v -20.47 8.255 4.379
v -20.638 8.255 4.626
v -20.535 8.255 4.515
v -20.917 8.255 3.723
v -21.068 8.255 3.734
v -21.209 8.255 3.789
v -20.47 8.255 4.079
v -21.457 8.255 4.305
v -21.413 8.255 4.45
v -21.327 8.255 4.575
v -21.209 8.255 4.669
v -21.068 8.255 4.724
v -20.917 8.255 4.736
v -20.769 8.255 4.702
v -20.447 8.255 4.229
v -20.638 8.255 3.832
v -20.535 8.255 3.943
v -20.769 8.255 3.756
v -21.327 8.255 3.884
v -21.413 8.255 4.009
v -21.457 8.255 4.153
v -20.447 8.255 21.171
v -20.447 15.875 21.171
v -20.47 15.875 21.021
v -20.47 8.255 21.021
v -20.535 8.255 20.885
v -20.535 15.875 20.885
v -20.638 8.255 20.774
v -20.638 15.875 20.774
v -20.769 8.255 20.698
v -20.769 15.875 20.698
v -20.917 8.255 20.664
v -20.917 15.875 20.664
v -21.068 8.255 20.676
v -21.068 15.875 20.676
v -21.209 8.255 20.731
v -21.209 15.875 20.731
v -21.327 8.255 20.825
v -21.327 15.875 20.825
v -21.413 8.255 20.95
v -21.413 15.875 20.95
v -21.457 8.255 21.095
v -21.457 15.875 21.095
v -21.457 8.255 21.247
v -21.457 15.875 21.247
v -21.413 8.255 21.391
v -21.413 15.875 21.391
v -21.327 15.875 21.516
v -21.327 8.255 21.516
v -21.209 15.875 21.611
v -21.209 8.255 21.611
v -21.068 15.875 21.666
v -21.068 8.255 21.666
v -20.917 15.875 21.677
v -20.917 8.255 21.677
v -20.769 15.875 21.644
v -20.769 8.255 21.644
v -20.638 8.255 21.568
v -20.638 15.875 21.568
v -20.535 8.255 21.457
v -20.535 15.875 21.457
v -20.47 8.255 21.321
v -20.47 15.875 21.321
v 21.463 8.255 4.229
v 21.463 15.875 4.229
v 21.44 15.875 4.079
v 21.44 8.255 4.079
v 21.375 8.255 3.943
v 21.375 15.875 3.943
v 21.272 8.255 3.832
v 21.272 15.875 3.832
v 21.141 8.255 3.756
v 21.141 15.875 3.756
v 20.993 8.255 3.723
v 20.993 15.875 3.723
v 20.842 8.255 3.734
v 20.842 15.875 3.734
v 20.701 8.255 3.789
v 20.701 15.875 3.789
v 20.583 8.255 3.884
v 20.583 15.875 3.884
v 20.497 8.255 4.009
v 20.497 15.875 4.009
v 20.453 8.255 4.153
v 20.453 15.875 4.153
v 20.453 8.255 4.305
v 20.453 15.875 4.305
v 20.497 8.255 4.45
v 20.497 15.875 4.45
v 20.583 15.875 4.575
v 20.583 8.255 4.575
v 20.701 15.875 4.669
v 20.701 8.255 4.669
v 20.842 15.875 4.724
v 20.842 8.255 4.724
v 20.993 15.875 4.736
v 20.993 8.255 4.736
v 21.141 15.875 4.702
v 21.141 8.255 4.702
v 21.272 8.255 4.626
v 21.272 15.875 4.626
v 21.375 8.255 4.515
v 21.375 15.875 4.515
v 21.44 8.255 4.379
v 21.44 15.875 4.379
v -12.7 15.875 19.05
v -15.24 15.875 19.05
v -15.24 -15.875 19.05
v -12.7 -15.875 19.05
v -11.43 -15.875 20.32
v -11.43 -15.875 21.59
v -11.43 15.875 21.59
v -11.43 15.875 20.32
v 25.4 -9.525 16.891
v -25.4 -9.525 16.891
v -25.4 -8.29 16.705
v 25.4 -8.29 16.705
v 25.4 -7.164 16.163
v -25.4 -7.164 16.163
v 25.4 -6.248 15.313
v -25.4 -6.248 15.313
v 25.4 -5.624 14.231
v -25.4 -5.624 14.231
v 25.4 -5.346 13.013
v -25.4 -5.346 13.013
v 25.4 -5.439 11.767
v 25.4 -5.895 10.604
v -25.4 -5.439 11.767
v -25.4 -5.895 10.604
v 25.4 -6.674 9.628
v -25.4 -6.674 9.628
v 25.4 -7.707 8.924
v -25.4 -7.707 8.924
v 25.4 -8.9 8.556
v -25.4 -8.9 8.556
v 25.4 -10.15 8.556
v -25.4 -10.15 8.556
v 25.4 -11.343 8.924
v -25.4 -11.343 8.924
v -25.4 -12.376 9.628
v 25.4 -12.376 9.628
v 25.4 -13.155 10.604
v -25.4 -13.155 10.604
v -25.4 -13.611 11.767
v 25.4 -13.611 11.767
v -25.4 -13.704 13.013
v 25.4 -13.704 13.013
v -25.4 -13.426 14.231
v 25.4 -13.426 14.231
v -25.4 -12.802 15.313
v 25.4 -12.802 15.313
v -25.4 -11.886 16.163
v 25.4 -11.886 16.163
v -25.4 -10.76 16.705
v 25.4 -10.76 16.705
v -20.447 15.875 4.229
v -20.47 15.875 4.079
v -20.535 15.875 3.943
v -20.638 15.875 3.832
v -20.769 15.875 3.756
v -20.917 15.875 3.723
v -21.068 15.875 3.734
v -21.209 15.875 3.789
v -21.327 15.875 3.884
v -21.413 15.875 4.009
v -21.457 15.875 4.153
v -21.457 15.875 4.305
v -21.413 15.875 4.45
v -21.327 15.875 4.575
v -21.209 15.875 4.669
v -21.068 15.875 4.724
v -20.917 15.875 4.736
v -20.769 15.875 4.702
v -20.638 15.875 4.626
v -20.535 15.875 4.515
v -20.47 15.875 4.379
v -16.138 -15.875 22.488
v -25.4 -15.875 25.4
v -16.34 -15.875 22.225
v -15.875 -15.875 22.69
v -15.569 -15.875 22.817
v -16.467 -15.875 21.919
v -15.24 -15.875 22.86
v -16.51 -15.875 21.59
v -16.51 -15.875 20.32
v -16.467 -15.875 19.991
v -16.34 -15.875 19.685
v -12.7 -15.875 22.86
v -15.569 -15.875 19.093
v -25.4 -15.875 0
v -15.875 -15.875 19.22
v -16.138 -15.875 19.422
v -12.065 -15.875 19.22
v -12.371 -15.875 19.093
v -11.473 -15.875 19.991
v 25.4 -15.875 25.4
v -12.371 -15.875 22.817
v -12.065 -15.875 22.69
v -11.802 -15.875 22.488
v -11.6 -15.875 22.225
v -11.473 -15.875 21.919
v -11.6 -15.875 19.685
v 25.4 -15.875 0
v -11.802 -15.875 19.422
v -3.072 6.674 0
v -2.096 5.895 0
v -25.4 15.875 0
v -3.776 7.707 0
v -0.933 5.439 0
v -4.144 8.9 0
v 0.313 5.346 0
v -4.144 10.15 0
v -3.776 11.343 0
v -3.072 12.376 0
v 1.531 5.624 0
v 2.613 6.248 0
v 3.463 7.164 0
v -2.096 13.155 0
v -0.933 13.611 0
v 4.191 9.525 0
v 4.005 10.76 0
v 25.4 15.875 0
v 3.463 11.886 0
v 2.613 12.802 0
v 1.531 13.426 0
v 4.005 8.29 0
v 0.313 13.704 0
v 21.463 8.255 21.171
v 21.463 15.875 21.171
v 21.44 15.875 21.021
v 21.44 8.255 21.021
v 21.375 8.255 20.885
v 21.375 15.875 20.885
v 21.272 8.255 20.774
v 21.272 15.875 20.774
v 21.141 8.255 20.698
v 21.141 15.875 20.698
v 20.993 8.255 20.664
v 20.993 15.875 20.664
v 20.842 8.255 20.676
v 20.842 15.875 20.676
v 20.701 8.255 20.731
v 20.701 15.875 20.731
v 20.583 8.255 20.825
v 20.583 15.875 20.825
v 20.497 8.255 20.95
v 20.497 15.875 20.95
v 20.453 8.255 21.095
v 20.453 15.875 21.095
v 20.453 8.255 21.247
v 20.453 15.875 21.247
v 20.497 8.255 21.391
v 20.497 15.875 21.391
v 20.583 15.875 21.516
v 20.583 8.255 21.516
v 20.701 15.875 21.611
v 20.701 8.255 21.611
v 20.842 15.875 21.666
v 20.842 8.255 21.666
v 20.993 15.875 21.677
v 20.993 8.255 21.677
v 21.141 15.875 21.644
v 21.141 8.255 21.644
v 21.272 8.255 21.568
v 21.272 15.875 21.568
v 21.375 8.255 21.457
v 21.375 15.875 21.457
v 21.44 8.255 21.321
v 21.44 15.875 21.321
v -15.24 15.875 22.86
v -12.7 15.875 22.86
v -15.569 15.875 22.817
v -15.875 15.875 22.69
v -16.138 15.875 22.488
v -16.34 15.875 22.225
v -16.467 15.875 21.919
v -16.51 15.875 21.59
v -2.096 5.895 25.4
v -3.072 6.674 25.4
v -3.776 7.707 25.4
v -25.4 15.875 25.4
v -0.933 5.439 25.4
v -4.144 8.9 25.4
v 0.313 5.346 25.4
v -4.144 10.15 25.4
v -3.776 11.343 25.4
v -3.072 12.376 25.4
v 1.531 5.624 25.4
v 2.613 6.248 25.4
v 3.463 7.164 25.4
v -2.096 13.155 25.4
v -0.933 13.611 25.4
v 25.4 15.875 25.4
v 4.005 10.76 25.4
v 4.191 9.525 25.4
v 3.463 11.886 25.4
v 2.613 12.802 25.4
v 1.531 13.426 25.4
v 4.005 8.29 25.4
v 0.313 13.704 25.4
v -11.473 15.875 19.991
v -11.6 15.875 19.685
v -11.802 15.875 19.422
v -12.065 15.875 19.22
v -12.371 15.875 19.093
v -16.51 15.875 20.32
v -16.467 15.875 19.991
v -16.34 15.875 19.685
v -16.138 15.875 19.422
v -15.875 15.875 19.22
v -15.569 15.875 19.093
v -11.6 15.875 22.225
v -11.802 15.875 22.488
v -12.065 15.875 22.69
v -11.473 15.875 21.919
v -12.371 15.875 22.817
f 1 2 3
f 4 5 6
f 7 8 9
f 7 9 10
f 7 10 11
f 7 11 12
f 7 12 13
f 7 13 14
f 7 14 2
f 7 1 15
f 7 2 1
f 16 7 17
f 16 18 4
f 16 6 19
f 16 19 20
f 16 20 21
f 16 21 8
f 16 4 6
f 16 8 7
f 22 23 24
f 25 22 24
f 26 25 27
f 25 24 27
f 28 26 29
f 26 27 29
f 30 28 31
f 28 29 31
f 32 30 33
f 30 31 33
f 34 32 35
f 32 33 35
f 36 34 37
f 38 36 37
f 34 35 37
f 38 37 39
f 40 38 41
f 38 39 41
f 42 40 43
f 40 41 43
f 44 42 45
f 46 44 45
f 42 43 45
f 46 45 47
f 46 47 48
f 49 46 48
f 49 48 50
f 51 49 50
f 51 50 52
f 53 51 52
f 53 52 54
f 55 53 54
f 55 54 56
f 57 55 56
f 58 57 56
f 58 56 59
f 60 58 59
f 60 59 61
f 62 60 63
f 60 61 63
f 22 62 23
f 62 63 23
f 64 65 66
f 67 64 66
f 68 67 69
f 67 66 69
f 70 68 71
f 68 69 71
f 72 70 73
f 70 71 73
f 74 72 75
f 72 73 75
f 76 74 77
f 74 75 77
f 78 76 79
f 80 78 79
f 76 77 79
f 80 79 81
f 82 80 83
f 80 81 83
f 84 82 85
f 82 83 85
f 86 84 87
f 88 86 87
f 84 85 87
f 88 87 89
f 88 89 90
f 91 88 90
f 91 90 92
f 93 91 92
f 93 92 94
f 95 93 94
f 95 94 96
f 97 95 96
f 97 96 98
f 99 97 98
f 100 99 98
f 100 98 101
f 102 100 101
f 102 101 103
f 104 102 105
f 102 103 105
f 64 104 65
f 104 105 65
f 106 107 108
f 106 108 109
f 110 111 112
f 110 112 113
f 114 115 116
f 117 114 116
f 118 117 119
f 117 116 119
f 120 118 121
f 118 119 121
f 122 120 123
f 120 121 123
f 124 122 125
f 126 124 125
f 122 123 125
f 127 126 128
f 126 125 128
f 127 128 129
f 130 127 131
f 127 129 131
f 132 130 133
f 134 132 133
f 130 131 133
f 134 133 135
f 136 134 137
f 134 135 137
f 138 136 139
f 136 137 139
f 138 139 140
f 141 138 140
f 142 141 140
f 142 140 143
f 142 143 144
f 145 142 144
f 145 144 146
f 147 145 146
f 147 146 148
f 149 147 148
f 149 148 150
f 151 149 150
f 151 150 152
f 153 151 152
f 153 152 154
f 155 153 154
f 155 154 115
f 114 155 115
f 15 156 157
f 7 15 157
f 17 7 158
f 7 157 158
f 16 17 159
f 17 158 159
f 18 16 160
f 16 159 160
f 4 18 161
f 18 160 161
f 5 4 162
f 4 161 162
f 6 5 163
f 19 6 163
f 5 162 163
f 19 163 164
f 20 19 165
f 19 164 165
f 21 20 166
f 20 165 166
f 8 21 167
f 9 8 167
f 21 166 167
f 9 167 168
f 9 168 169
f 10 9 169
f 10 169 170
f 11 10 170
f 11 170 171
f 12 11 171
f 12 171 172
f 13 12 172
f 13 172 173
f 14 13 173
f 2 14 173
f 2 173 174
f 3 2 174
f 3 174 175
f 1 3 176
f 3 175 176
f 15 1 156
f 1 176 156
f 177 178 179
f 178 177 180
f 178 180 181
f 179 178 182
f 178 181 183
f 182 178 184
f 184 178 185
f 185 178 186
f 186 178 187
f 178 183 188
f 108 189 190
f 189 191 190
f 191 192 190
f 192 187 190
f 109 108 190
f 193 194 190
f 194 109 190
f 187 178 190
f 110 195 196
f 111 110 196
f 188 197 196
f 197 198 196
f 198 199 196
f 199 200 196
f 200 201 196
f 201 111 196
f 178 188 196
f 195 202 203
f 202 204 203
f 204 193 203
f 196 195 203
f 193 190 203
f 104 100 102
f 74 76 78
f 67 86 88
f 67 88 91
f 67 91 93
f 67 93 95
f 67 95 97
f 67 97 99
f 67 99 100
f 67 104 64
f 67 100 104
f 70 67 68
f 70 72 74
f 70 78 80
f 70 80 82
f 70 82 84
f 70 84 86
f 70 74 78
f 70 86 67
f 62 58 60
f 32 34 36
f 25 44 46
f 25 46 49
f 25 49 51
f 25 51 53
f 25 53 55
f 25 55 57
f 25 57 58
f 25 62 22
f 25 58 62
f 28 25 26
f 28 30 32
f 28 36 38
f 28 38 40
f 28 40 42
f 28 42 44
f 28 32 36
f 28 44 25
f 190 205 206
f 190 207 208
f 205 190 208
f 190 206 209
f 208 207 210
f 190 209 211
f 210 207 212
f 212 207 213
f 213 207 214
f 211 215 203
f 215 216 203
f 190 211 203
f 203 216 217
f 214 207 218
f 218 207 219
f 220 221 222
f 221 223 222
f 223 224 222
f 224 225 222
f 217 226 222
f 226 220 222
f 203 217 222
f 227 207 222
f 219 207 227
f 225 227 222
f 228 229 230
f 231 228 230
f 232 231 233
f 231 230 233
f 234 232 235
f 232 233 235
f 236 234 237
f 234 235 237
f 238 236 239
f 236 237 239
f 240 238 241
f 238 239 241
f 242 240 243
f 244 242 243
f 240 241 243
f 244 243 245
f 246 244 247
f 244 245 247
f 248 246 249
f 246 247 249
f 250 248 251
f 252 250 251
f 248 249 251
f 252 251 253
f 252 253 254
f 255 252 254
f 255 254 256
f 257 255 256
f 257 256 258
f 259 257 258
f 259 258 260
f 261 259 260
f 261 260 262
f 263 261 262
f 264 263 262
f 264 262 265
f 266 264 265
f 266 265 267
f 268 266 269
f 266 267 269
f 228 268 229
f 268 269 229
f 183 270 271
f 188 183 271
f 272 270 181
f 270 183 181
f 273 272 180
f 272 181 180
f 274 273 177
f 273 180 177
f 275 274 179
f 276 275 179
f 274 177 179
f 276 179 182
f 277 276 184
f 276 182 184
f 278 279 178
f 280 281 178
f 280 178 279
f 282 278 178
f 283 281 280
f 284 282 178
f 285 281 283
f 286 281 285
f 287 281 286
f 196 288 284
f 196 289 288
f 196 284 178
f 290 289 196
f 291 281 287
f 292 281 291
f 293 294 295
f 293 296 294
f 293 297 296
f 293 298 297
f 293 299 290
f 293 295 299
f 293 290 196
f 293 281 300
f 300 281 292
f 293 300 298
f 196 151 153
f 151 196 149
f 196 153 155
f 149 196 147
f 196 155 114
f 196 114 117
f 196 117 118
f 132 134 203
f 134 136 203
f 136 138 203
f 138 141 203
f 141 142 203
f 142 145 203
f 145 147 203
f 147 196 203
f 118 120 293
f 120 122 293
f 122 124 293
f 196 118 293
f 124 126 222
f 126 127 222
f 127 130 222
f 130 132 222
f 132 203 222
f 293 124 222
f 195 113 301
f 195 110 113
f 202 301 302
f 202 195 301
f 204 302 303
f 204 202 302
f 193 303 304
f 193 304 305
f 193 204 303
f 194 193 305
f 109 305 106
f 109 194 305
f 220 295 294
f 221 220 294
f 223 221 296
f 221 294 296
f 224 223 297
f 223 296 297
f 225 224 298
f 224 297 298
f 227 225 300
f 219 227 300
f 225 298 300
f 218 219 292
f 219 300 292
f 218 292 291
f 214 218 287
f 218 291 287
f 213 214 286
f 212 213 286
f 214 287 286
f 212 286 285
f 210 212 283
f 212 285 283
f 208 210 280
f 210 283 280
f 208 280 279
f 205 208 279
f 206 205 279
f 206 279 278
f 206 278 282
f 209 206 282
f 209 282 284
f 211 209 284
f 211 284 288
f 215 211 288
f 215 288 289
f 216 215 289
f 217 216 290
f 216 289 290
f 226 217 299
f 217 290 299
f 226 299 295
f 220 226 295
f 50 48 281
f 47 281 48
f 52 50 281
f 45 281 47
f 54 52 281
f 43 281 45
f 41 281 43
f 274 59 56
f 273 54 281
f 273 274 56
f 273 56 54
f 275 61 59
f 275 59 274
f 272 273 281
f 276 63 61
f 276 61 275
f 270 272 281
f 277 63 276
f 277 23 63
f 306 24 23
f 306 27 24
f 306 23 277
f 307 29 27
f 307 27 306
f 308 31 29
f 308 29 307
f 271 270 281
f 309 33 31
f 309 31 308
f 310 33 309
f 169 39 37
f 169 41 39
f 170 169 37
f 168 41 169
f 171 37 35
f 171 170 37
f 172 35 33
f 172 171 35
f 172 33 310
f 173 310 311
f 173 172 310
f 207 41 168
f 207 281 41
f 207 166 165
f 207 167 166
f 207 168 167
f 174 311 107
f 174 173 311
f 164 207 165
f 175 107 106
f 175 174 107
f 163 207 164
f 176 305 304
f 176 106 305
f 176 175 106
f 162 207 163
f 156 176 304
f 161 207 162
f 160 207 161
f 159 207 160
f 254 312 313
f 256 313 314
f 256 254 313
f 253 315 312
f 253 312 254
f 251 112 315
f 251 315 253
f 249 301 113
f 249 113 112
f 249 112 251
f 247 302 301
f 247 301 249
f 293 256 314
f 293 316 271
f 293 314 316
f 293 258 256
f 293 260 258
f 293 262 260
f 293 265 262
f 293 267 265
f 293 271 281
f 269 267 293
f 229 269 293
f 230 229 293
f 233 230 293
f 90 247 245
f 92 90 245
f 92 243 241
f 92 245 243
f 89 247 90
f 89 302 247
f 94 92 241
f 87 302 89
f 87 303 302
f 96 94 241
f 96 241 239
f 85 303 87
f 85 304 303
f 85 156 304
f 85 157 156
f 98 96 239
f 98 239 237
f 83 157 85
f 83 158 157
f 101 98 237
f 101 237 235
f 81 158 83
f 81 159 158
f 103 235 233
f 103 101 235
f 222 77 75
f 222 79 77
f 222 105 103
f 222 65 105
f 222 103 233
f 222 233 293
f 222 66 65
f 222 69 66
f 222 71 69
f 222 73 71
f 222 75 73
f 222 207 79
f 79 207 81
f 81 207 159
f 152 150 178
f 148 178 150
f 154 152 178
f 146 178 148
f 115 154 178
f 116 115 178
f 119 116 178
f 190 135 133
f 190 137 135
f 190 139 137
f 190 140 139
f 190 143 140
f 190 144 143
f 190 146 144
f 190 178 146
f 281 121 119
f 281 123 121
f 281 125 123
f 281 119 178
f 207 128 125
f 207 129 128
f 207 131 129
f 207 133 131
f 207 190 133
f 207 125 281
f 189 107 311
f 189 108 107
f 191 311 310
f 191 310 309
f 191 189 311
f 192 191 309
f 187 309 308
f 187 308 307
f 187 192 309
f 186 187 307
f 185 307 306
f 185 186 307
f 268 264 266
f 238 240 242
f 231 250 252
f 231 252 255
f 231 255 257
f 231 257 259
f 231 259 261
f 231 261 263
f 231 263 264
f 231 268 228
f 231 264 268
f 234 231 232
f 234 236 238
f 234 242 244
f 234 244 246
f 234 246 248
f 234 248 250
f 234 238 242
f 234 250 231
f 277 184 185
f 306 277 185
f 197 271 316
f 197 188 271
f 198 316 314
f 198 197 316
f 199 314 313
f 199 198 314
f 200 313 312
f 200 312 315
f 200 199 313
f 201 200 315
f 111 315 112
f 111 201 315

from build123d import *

# Parameters (mm, degrees)
SKETCH1_W           = 50.8
SKETCH1_H           = 31.75
BOSS_EXTRUDE1_DEPTH = 25.4
SKETCH4_R           = 4.191
CUT_EXTRUDE1_DEPTH  = 152.4
SKETCH5_R           = 4.191
CUT_EXTRUDE2_DEPTH  = 25.4
SKETCH7_R           = 0.508
CUT_EXTRUDE3_DEPTH  = 7.62
SKETCH9_W           = 5.08
SKETCH9_H           = 3.81
CUT_EXTRUDE5_DEPTH  = 152.4
FILLET1_R           = 1.27


with BuildPart() as part:
    # Sketch1 → Boss-Extrude1 (new body)
    with BuildSketch(Plane.XY):
        Rectangle(SKETCH1_W, SKETCH1_H)
    extrude(amount=BOSS_EXTRUDE1_DEPTH)

    # Sketch4 → Cut-Extrude1 (cut)
    with BuildSketch(Plane.ZY.offset(25.4)):
        with Locations((12.7, -9.525)):
            Circle(SKETCH4_R)
    extrude(amount=-CUT_EXTRUDE1_DEPTH, mode=Mode.SUBTRACT)

    # Sketch5 → Cut-Extrude2 (cut)
    with BuildSketch(Plane.XY.offset(25.4)):
        with Locations((0, 9.525)):
            Circle(SKETCH5_R)
    extrude(amount=-CUT_EXTRUDE2_DEPTH, mode=Mode.SUBTRACT)

    # Sketch7 → Cut-Extrude3 (cut)
    with BuildSketch(Plane(origin=(0, 15.875, 0), x_dir=(1, 0, 0), z_dir=(0, 1, 0))):
        with Locations((-20.955, -4.2291)):
            Circle(SKETCH7_R)
        with Locations((-20.955, -21.1709)):
            Circle(SKETCH7_R)
        with Locations((20.955, -4.2291)):
            Circle(SKETCH7_R)
        with Locations((20.955, -21.1709)):
            Circle(SKETCH7_R)
    extrude(amount=-CUT_EXTRUDE3_DEPTH, mode=Mode.SUBTRACT)

    # Sketch9 → Cut-Extrude5 (cut)
    with BuildSketch(Plane(origin=(0, 15.875, 0), x_dir=(1, 0, 0), z_dir=(0, 1, 0))):
        with Locations((-13.97, -20.955)):
            Rectangle(SKETCH9_W, SKETCH9_H)
    extrude(amount=-CUT_EXTRUDE5_DEPTH, mode=Mode.SUBTRACT)

    # Fillet1
    fillet1_edges = [part.edges().sort_by_distance(p)[0] for p in [
        (-16.51, 0, 22.86),
        (-16.51, 0, 19.05),
        (-11.43, 0, 19.05),
        (-11.43, 0, 22.86),
    ]]
    fillet(fillet1_edges, radius=FILLET1_R)


solid = part.part
